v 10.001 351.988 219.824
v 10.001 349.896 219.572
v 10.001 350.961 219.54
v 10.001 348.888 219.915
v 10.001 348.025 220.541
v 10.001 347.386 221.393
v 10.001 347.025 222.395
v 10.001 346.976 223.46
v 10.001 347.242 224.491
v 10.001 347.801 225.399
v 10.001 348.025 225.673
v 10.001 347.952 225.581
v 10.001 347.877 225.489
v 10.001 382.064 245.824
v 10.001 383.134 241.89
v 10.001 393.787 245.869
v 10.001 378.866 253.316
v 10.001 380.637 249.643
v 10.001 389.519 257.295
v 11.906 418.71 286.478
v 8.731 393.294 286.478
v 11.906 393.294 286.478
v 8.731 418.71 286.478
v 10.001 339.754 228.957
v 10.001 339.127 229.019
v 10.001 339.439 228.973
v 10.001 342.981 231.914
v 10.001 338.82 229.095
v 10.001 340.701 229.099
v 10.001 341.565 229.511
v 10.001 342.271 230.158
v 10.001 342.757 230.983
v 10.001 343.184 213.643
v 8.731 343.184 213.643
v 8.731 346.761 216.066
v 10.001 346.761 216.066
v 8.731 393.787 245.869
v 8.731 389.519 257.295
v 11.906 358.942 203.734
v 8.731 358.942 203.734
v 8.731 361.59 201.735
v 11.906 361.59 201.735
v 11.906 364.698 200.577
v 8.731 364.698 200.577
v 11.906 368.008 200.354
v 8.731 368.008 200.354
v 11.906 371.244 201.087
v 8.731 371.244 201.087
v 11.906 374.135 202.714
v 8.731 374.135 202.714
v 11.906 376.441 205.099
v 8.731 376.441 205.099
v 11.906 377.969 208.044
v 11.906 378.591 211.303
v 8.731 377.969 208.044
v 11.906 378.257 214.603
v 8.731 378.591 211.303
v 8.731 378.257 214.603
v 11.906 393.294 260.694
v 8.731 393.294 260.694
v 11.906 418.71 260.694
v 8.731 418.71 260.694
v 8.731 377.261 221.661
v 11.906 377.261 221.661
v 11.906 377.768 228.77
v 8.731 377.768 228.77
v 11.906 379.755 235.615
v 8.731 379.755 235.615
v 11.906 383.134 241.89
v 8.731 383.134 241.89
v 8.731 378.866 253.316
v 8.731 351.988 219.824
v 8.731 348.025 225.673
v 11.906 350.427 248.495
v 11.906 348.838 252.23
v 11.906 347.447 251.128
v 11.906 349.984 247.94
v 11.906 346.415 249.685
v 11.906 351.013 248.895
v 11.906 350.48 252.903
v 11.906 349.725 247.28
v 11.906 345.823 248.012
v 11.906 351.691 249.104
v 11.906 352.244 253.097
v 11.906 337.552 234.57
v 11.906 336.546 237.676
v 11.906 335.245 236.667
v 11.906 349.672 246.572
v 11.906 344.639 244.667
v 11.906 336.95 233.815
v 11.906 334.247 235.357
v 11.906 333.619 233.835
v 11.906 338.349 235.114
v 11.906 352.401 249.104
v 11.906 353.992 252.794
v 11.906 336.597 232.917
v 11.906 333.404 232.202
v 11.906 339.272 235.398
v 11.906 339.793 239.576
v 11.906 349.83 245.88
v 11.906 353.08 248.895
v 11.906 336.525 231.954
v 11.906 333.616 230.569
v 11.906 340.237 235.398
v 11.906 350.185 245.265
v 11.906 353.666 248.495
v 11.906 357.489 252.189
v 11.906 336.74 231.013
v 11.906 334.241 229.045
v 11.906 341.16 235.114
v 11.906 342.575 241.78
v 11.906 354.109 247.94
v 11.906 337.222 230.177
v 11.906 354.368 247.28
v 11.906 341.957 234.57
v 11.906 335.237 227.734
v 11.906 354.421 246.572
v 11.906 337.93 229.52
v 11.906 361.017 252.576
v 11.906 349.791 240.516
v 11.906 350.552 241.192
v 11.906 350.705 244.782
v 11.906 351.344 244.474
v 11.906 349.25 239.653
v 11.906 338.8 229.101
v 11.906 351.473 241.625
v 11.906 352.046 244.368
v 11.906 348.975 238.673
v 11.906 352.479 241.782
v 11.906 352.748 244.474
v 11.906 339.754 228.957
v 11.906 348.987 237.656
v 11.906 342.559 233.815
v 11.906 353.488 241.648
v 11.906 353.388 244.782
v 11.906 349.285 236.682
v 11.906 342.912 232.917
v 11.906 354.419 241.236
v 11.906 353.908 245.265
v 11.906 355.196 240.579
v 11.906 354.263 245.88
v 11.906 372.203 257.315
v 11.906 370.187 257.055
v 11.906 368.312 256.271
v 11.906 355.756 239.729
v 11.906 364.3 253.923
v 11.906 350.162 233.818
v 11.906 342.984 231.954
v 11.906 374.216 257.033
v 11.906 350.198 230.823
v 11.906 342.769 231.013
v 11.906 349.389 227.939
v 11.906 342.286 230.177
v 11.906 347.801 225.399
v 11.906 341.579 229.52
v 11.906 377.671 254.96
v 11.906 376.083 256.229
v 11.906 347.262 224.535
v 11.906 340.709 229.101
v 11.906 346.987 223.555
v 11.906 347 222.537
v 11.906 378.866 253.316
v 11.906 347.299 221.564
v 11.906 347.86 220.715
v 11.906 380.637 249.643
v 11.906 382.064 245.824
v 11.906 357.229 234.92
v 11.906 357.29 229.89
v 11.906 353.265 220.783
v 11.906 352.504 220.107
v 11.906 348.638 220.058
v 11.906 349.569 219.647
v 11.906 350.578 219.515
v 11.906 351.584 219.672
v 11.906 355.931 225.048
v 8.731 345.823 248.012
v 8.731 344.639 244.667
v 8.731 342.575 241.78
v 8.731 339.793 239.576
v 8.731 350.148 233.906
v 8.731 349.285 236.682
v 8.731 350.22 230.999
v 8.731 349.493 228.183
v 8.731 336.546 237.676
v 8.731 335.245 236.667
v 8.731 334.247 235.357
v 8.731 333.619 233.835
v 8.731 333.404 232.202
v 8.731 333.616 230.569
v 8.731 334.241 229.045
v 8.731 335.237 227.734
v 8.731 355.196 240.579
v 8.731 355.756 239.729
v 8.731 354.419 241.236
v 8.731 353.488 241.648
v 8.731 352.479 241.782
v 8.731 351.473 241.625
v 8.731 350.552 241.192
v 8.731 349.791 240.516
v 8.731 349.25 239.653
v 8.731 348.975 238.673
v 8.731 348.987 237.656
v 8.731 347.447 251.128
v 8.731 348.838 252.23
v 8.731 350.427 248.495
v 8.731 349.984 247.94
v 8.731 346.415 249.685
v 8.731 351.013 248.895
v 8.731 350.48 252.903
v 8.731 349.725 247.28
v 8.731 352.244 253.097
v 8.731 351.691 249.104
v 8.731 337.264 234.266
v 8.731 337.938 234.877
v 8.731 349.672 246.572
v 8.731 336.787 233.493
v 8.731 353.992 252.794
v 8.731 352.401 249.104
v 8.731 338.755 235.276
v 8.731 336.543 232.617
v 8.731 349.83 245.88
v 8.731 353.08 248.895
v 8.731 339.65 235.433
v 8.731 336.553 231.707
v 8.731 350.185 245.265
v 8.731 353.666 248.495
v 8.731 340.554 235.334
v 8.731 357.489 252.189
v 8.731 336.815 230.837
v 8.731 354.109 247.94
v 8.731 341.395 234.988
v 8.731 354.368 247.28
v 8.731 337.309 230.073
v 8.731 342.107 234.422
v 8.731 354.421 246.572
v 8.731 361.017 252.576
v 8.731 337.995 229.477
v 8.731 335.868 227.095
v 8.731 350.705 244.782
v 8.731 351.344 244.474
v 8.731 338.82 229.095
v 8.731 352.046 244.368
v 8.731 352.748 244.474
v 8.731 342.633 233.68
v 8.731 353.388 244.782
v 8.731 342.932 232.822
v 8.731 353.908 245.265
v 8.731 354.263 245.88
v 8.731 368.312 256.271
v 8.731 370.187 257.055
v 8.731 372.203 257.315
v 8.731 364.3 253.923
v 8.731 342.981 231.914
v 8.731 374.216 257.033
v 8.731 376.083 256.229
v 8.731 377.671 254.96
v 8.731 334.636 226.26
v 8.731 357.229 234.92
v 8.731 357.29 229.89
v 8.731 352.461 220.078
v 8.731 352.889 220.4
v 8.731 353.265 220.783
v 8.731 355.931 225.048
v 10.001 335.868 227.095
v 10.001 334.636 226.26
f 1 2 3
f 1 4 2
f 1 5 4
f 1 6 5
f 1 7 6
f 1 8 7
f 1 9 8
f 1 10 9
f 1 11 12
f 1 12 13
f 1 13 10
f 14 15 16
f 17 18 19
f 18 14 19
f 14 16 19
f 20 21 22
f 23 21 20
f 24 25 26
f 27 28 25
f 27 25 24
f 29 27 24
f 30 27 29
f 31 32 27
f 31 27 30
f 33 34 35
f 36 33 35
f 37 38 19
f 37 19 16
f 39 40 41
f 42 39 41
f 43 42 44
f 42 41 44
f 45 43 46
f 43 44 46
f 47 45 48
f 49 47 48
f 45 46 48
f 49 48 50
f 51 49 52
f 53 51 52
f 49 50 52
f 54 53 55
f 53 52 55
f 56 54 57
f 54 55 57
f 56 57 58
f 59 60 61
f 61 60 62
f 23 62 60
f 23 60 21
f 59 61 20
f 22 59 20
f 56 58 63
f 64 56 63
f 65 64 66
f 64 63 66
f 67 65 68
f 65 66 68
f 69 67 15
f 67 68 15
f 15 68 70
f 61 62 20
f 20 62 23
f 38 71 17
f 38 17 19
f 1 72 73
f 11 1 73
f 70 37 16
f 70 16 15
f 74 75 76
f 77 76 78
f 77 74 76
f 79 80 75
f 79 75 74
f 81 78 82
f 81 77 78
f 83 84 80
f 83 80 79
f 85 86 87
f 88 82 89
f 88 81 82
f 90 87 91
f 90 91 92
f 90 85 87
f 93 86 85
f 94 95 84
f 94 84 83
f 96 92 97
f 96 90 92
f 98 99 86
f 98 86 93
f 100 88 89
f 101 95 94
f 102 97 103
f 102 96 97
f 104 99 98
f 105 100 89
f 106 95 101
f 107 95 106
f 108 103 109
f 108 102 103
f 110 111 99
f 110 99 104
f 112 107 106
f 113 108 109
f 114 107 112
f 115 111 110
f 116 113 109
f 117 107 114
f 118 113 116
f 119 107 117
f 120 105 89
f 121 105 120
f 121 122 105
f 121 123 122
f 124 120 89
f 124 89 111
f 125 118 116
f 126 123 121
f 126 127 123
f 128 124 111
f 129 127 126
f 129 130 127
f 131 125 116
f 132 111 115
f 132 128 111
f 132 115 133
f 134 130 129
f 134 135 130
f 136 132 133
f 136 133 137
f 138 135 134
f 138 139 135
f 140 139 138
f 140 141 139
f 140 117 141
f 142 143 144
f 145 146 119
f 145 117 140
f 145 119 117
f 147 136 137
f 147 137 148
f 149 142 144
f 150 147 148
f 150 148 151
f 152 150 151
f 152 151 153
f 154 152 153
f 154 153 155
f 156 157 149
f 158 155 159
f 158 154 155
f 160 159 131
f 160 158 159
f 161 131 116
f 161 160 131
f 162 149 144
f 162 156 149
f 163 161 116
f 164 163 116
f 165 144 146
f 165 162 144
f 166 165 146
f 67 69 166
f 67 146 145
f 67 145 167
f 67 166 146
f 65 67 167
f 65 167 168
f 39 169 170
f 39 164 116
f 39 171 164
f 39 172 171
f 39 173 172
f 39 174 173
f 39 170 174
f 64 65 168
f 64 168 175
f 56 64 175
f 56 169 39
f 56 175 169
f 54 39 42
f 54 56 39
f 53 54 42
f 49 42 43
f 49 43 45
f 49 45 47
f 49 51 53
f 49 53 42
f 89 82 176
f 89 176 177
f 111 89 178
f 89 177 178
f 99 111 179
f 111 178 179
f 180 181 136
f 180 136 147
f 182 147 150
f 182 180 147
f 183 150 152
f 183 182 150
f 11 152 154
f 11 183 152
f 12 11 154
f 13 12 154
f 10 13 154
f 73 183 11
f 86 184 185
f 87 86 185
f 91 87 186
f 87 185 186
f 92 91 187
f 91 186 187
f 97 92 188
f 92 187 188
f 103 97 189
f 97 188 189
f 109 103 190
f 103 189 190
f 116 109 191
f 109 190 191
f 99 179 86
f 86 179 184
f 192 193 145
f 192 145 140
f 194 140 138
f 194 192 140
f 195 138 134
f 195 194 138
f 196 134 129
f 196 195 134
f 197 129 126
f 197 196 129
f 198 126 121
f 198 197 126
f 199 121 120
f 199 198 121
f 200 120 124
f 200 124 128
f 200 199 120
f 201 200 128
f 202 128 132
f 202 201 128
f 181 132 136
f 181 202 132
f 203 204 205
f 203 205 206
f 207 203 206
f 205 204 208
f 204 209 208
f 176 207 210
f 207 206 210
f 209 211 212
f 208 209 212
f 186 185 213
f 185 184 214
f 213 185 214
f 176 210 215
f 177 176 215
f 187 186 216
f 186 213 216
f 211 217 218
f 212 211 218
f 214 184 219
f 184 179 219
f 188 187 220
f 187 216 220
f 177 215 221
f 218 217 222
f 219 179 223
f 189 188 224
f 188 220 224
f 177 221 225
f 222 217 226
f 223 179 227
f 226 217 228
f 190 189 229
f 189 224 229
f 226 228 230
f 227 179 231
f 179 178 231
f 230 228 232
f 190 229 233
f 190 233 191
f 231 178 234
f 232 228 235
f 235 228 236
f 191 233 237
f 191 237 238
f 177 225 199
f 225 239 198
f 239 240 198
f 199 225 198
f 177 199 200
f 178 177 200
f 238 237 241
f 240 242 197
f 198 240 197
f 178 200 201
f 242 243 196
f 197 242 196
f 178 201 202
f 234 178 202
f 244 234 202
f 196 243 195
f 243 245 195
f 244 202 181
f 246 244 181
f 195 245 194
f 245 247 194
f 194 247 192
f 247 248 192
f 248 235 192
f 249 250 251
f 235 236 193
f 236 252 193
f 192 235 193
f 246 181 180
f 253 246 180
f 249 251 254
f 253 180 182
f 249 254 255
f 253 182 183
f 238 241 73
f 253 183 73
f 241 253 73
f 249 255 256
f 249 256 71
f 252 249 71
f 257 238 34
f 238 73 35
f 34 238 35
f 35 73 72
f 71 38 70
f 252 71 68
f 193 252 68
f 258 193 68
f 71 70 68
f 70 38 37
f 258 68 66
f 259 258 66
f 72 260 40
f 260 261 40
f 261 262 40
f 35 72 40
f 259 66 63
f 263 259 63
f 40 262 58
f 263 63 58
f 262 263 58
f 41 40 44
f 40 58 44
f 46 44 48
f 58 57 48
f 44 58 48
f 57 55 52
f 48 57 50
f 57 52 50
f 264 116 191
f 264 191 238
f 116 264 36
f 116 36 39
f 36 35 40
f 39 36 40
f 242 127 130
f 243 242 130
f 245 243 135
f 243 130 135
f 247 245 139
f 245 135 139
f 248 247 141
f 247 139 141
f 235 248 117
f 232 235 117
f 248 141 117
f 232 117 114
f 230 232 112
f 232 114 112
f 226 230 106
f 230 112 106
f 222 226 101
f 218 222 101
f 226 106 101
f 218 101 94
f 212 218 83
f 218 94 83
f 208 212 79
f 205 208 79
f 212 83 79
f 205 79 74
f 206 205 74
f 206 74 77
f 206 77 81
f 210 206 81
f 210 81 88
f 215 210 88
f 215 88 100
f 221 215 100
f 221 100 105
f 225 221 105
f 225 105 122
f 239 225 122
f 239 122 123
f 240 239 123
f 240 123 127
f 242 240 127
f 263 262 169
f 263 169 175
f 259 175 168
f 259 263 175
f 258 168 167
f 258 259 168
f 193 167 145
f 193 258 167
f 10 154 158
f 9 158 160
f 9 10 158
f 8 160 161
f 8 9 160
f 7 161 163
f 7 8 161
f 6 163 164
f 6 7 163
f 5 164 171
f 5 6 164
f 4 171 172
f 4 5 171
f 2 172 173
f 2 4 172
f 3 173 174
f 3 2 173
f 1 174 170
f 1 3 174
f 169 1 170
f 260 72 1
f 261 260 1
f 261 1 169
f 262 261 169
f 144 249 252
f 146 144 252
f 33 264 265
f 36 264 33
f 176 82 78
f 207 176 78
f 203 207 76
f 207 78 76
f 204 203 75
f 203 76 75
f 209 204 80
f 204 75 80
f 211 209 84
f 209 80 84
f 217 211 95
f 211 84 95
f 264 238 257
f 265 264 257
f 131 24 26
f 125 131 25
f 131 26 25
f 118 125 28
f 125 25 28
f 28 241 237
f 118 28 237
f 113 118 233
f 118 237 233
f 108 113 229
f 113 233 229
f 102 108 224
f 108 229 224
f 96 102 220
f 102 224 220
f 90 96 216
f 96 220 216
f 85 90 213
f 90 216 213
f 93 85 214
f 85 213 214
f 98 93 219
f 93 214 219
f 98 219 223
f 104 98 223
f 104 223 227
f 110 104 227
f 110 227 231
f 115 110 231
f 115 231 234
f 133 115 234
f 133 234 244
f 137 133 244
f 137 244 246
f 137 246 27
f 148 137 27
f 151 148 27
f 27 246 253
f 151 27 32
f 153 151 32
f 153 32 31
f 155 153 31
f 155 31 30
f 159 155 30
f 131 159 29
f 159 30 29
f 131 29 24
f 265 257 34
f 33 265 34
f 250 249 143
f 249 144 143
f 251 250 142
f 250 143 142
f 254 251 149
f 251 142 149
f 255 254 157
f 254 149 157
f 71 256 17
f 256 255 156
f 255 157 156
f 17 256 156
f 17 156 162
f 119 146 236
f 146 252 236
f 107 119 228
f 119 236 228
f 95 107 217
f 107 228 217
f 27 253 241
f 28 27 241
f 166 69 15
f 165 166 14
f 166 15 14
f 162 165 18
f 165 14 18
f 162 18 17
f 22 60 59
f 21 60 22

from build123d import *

# Parameters (mm, degrees)
BOSS_EXTRUDE2_DEPTH            = 19.05
SKETCH9_R                      = 3.2385
SKETCH9_R_2                    = 3.175
CUT_EXTRUDE4_DEPTH             = 153.631238014
CUT_EXTRUDE7_DEPTH             = 52.07
SKETCH16_W                     = 6.35
SKETCH16_H                     = 9.525
BOSS_EXTRUDE3_DEPTH            = 52.07
BOSS_EXTRUDE5_DEPTH            = 38.1
CUT_EXTRUDE10_DEPTH            = 153.631238014
SKETCH22_R                     = 3.175
CUT_EXTRUDE11_DEPTH            = 535.426844636
CUT_EXTRUDE13_DEPTH            = 3.175
CUT_EXTRUDE13_DEPTH_BACK       = 5.08
SKETCH27_R                     = 6.35
SKETCH28_W                     = 12.7
SKETCH28_H                     = 6.35
CUT_EXTRUDE14_DEPTH            = 6.35
CUT_EXTRUDE18_DEPTH            = 25.4
CUT_EXTRUDE23_REACH            = 116.123
SKETCH48_W                     = 4.7625
SKETCH48_H                     = 46.015558287
BOSS_EXTRUDE6_DEPTH            = 2.38125
BOSS_EXTRUDE9_START            = 6.35
SKETCH41_R                     = 1.651
BOSS_EXTRUDE9_DEPTH            = 3.175
SKETCH44_W                     = 2.15265
SKETCH44_H                     = 21.43125
F_8_CLEARANCE_HOLE1_AT_2_COUNT = 2
F_8_CLEARANCE_HOLE1_AT_2_PITCH = 14.1097
SKETCH54_R                     = 3.2385
CUT_EXTRUDE29_DEPTH            = 534.965103431
BOSS_EXTRUDE17_DEPTH           = 3.175
SKETCH47_R                     = 2.38125
CUT_EXTRUDE22_DEPTH            = 534.965103431
FILLET10_R                     = 12.7
FILLET11_R                     = 7.62
BOSS_EXTRUDE10_DEPTH           = 4.7625
SKETCH57_R                     = 3.175
CUT_EXTRUDE31_DEPTH            = 534.497648303
SKETCH58_R                     = 3.175
CUT_EXTRUDE32_DEPTH            = 534.497648303
BOSS_EXTRUDE12_DEPTH           = 4.7625
FILLET4_R                      = 161.925
CUT_EXTRUDE33_DEPTH            = 534.497648303
SKETCH63_W                     = 2.45745
SKETCH63_H                     = 21.43125
FILLET6_R                      = 1.27
FILLET7_R                      = 2
FILLET9_R                      = 12.7
FILLET8_R                      = 6.35
BOSS_EXTRUDE15_DEPTH           = 1.27
SKETCH67_W                     = 25.783881398
SKETCH67_H                     = 25.415540234
BOSS_EXTRUDE16_DEPTH           = 3.175


with BuildPart() as part:
    # Sketch4 → Boss-Extrude2 (new, symmetric)
    with BuildSketch(Plane(origin=(0, 0, 0), x_dir=(0, 0, -1), z_dir=(1, 0, 0))):
        with BuildLine():
            Line((-186.846778023, 405.26156603), (-158.205357675, 369.030625673))
            Line((-158.205357675, 369.030625673), (-140.256718713, 375.414109002))
            Line((-140.256718713, 375.414109002), (-157.704906478, 424.473722165))
            Line((-157.704906478, 424.473722165), (-175.65354544, 418.090238836))
            Line((-175.65354544, 418.090238836), (-177.355807661, 422.876542559))
            ThreePointArc((-177.355807661, 422.876542559), (-243.191724351, 450.45722133), (-264.474202715, 382.324131846))
            Line((-264.474202715, 382.324131846), (-237.676042854, 336.546390968))
            ThreePointArc((-237.676042854, 336.546390968), (-229.492825478, 334.008496997), (-226.23061556, 341.930866521))
            Line((-226.23061556, 341.930866521), (-246.687133952, 397.9992122))
            ThreePointArc((-246.687133952, 397.9992122), (-243.637808701, 421.265815224), (-222.825693032, 432.10505146))
            ThreePointArc((-222.825693032, 432.10505146), (-209.542420342, 429.05833538), (-198.914683118, 420.527273681))
            Line((-198.914683118, 420.527273681), (-186.846778023, 405.26156603))
        make_face()
    extrude(amount=BOSS_EXTRUDE2_DEPTH, both=True)

    # Sketch9 → Cut-Extrude4 (cut, through all)
    with BuildSketch(Plane(origin=(0, 426.601549941, 151.722026824), x_dir=(1, 0, 0), z_dir=(0, 0.9421857722885012, 0.33509098838542445))):
        with Locations(Location((6.35, -19.05, 0), (0, 0, 270))):
            Circle(SKETCH9_R)
        with Locations((-9.525, -6.35)):
            Circle(SKETCH9_R_2)
        with Locations((9.525, -6.35)):
            Circle(SKETCH9_R_2)
    extrude(amount=-CUT_EXTRUDE4_DEPTH, mode=Mode.SUBTRACT)

    # Sketch15 → Cut-Extrude7 (cut)
    with BuildSketch(Plane(origin=(0, 426.601549941, 151.722026824), x_dir=(1, 0, 0), z_dir=(0, 0.9421857722885011, 0.33509098838542445))):
        Polygon((-3.175, -9.525), (6.35, -9.525), (9.525, -9.525), (9.525, -6.35), (-9.525, -6.35), (-9.525, -9.525), align=None)
    extrude(amount=-CUT_EXTRUDE7_DEPTH, mode=Mode.SUBTRACT)

    # Sketch16 → Boss-Extrude3 (add)
    with BuildSketch(Plane(origin=(0, 426.601549941, 151.722026824), x_dir=(1, 0, 0), z_dir=(0, 0.9421857722885012, 0.3350909883854245))):
        with Locations((15.875, -1.5875)):
            Rectangle(SKETCH16_W, SKETCH16_H)
        with Locations((-15.875, -1.5875)):
            Rectangle(SKETCH16_W, SKETCH16_H)
    extrude(amount=-BOSS_EXTRUDE3_DEPTH)

    # Sketch20 → Boss-Extrude5 (add)
    with BuildSketch(Plane(origin=(19.05, 0, 0), x_dir=(0, 0, -1), z_dir=(1, 0, 0))):
        with BuildLine():
            Line((-148.730586997, 427.665463829), (-175.65354544, 418.090238836))
            Line((-175.65354544, 418.090238836), (-177.355807661, 422.876542559))
            ThreePointArc((-177.355807661, 422.876542559), (-196.734821197, 447.304238729), (-227.005535657, 454.78370073))
            Line((-227.005535657, 454.78370073), (-160.433639767, 460.571301927))
            Line((-160.433639767, 460.571301927), (-148.730586997, 427.665463829))
        make_face()
    extrude(amount=-BOSS_EXTRUDE5_DEPTH)

    # Sketch21 → Cut-Extrude10 (cut, through all)
    with BuildSketch(Plane(origin=(0, 426.601549941, 151.722026824), x_dir=(1, 0, 0), z_dir=(0, -0.942185772288501, -0.335090988385425))):
        with BuildLine():
            Line((19.05, 14.478), (19.05, 6.35))
            Line((19.05, 6.35), (19.05, -3.175))
            Line((19.05, -3.175), (-19.05, -3.175))
            Line((-19.05, -3.175), (-19.05, 6.35))
            Line((-19.05, 6.35), (-19.05, 14.478))
            Line((-19.05, 14.478), (-15.97025, 14.478))
            Line((-15.97025, 14.478), (-8.0264, 25.0698))
            ThreePointArc((-8.0264, 25.0698), (0, 29.083), (8.0264, 25.0698))
            Line((8.0264, 25.0698), (15.97025, 14.478))
            Line((15.97025, 14.478), (19.05, 14.478))
        make_face()
    extrude(amount=-CUT_EXTRUDE10_DEPTH, mode=Mode.SUBTRACT)

    # Sketch22 → Cut-Extrude11 (cut, through all)
    with BuildSketch(Plane(origin=(19.05, 0, 0), x_dir=(0, 0, -1), z_dir=(1, 0, 0))):
        with Locations((-253.002053482, 402.413470169)):
            Circle(SKETCH22_R)
        with Locations((-239.490468058, 381.184164458)):
            Circle(SKETCH22_R)
    extrude(amount=-CUT_EXTRUDE11_DEPTH, mode=Mode.SUBTRACT)

    # Sketch27 → Cut-Extrude13 (cut, two sides: drawn at the far end of the back side and taken through both)
    with BuildSketch(Plane(origin=(-17.1704, -4.31523473, 12.133279938), x_dir=(-0.5432430093887411, -0.1572894719134328, -0.8247102853581115), z_dir=(0.7999999999999949, 0.20105459303125733, -0.5653114633731071)).offset(-CUT_EXTRUDE13_DEPTH_BACK)):
        with Locations(Location((-205.469391655, 414.258576717, 0), (0, 0, 168.252215141))):
            Circle(SKETCH27_R)
    extrude(amount=CUT_EXTRUDE13_DEPTH + CUT_EXTRUDE13_DEPTH_BACK, mode=Mode.SUBTRACT)

    # Sketch28 → Cut-Extrude14 (cut)
    with BuildSketch(Plane(origin=(0, -4.85144733, 13.640965611), x_dir=(-1, 0, 0), z_dir=(-1.200145339583648e-13, 0.33509098838542495, -0.942185772288501))):
        with Locations((-12.7, 481.353594719)):
            Rectangle(SKETCH28_W, SKETCH28_H)
    extrude(amount=-CUT_EXTRUDE14_DEPTH, mode=Mode.SUBTRACT)

    # Sketch33 → Cut-Extrude18 (cut, symmetric)
    with BuildSketch(Plane(origin=(0, 0, 0), x_dir=(0, 0, -1), z_dir=(1, 0, 0))):
        with BuildLine():
            Line((-199.247314558, 457.196933995), (-212.078601064, 429.719395123))
            ThreePointArc((-212.078601064, 429.719395123), (-239.987832709, 425.42992694), (-246.687133952, 397.9992122))
            Line((-246.687133952, 397.9992122), (-226.23061556, 341.930866521))
            ThreePointArc((-226.23061556, 341.930866521), (-229.492825478, 334.008496997), (-237.676042854, 336.546390968))
            Line((-237.676042854, 336.546390968), (-264.474202715, 382.324131846))
            ThreePointArc((-264.474202715, 382.324131846), (-265.693591855, 428.871937811), (-227.005535657, 454.78370073))
            Line((-227.005535657, 454.78370073), (-199.247314558, 457.196933995))
        make_face()
    extrude(amount=CUT_EXTRUDE18_DEPTH, both=True, mode=Mode.SUBTRACT)

    # Cut-Extrude23: up to this plane
    cut_extrude23_end = Plane(origin=(-108.1095773, 454.78370073, 227.005535657), z_dir=(0, 0.9962422144646194, 0.08661091223761264))
    # Sketch48 → Cut-Extrude23 (cut, up to the surface)
    with BuildSketch(Plane(origin=(0, 377.541936778, 134.273839059), x_dir=(1, 0, 0), z_dir=(0, -0.9421857722885012, -0.3350909883854244)), mode=Mode.PRIVATE) as cut_extrude23_sk1:
        with Locations((0, 32.532779144)):
            Rectangle(SKETCH48_W, SKETCH48_H)
    cut_extrude23_tool1 = split(extrude(cut_extrude23_sk1.sketch, amount=-CUT_EXTRUDE23_REACH, mode=Mode.PRIVATE), bisect_by=cut_extrude23_end, keep=Keep.BOTH, mode=Mode.PRIVATE)
    add(cut_extrude23_tool1.solids().sort_by_distance((0, 366.640496, 164.925761))[0], mode=Mode.SUBTRACT)


with BuildPart() as cut_extrude23_piece_1:
    # of the separate pieces the step leaves, piece 1, a body of its own (cut_extrude23_pieces)
    add(part.part.solids().sort_by_distance((-19.05, 457.196933995, 199.247314558))[0])


with BuildPart() as cut_extrude23_piece_2:
    # of the separate pieces the step leaves, piece 2, a body of its own (cut_extrude23_pieces)
    add(part.part.solids().sort_by_distance((19.05, 457.196933995, 199.247314558))[0])


with BuildPart() as body_3:
    # Sketch35 → Boss-Extrude6 (new, symmetric)
    with BuildSketch(Plane(origin=(0, 0, 0), x_dir=(0, 0, -1), z_dir=(1, 0, 0))):
        with BuildLine():
            Line((-237.676042854, 336.546390968), (-264.474202715, 382.324131846))
            ThreePointArc((-264.474202715, 382.324131846), (-265.472121099, 429.295088492), (-226.053156197, 454.857009691))
            Line((-226.053156197, 454.857009691), (-204.645177824, 456.727656689))
            Line((-204.645177824, 456.727656689), (-195.764245071, 457.499743714))
            Line((-195.764245071, 457.499743714), (-187.436501805, 446.96528118))
            Line((-187.436501805, 446.96528118), (-172.228614898, 427.727546572))
            Line((-172.228614898, 427.727546572), (-189.069775711, 408.073622684))
            Line((-189.069775711, 408.073622684), (-198.914683118, 420.527273681))
            ThreePointArc((-198.914683118, 420.527273681), (-209.542420342, 429.05833538), (-222.825693032, 432.10505146))
            ThreePointArc((-222.825693032, 432.10505146), (-243.637808701, 421.265815224), (-246.687133952, 397.9992122))
            Line((-246.687133952, 397.9992122), (-226.23061556, 341.930866521))
            ThreePointArc((-226.23061556, 341.930866521), (-229.492825478, 334.008496997), (-237.676042854, 336.546390968))
        make_face()
    extrude(amount=BOSS_EXTRUDE6_DEPTH, both=True)

    # Sketch44 → #8 Clearance Hole1 (revolve, cut)
    with BuildSketch(Plane(origin=(2.38125, 352.520342369, 238.205511608), x_dir=(0, 0, -1), z_dir=(0, 1, 0))):
        with Locations((1.076325, 10.715625)):
            Rectangle(SKETCH44_W, SKETCH44_H)
    f_8_clearance_hole1 = revolve(axis=Axis((8.73125, 352.520342369, 238.205511608), (-1, 0, 0)), mode=Mode.SUBTRACT)

    # #8 Clearance Hole1 at 2: #8 Clearance Hole1 ×2
    with Locations(*[Vector(0, -0.9047630823191329, -0.42591520854787757) * (i * F_8_CLEARANCE_HOLE1_AT_2_PITCH) for i in range(1, F_8_CLEARANCE_HOLE1_AT_2_COUNT)]):
        add(f_8_clearance_hole1, mode=Mode.SUBTRACT)

    # Sketch56 → Boss-Extrude10 (add)
    with BuildSketch(Plane.ZY.offset(2.38125)):
        Polygon((172.228614898, 427.727546572), (189.069775711, 408.073622684), (150.093881412, 374.128883937), (137.640230415, 383.973791344), align=None)
    extrude(amount=-BOSS_EXTRUDE10_DEPTH)

    # Sketch57 → Cut-Extrude31 (cut, through all)
    with BuildSketch(Plane.ZY.offset(2.38125)):
        with Locations((154.366633975, 389.773278837)):
            Circle(SKETCH57_R)
    extrude(amount=-CUT_EXTRUDE31_DEPTH, mode=Mode.SUBTRACT)

    # Sketch58 → Cut-Extrude32 (cut, through all)
    with BuildSketch(Plane(origin=(2.38125, 0, 0), x_dir=(0, 0, -1), z_dir=(1, 0, 0))):
        with Locations((-251.088512577, 393.691356506)):
            Circle(SKETCH58_R)
    extrude(amount=-CUT_EXTRUDE32_DEPTH, mode=Mode.SUBTRACT)

    # Sketch60 → Boss-Extrude12 (add)
    with BuildSketch(Plane.ZY.offset(2.38125)):
        with BuildLine():
            Line((238.16133602, 337.577946891), (232.720186483, 322.664546316))
            ThreePointArc((232.720186483, 322.664546316), (224.578366438, 318.875645901), (220.789466023, 327.017465946))
            Line((220.789466023, 327.017465946), (226.23061556, 341.930866521))
            ThreePointArc((226.23061556, 341.930866521), (230.019515975, 333.789046476), (238.16133602, 337.577946891))
        make_face()
    extrude(amount=-BOSS_EXTRUDE12_DEPTH)

    # Fillet4
    fillet4_edges = [body_3.edges().sort_by_distance(p)[0] for p in [
        (0, 337.040299626, 237.965175583),
    ]]
    fillet(fillet4_edges, radius=FILLET4_R)

    # Sketch61 → Cut-Extrude33 (cut, through all)
    with BuildSketch(Plane.ZY.offset(2.38125)):
        with BuildLine():
            Line((157.330045228, 408.881093338), (149.454119303, 398.91817254))
            ThreePointArc((149.454119303, 398.91817254), (151.090857413, 398.367142584), (152.779456246, 398.004955291))
            Line((152.779456246, 398.004955291), (159.820775427, 406.912111857))
            Line((159.820775427, 406.912111857), (157.330045228, 408.881093338))
        make_face()
    extrude(amount=-CUT_EXTRUDE33_DEPTH, mode=Mode.SUBTRACT)


with BuildPart() as body_4:
    # Sketch41 → Boss-Extrude9 (new body)
    with BuildSketch(Plane(origin=(2.38125, 0, 0), x_dir=(0, 0, -1), z_dir=(1, 0, 0)).offset(BOSS_EXTRUDE9_START)):
        with BuildLine():
            Line((-259.901827857, 374.513409299), (-237.676042854, 336.546390968))
            ThreePointArc((-237.676042854, 336.546390968), (-233.025285674, 333.458793542), (-227.733605481, 335.23669144))
            Line((-227.733605481, 335.23669144), (-203.734295846, 358.941993885))
            ThreePointArc((-203.734295846, 358.941993885), (-201.795644606, 372.748442455), (-214.603143546, 378.257014105))
            ThreePointArc((-214.603143546, 378.257014105), (-228.769887709, 377.768125905), (-241.890035296, 383.134444861))
            ThreePointArc((-241.890035296, 383.134444861), (-251.386309553, 379.848465993), (-259.901827857, 374.513409299))
        make_face()
        with Locations((-232.19597579, 339.754406706)):
            Circle(SKETCH41_R, mode=Mode.SUBTRACT)
        with BuildLine():
            ThreePointArc((-220.782994488, 353.265112137), (-229.890488905, 357.289515308), (-239.728720687, 355.756064675))
            ThreePointArc((-239.728720687, 355.756064675), (-241.441233915, 350.99713329), (-236.682302529, 349.284620062))
            ThreePointArc((-236.682302529, 349.284620062), (-230.822881705, 350.197907406), (-225.39867097, 347.801066971))
            ThreePointArc((-225.39867097, 347.801066971), (-220.358810146, 348.225251313), (-220.782994488, 353.265112137))
        make_face(mode=Mode.SUBTRACT)
    extrude(amount=BOSS_EXTRUDE9_DEPTH)


with BuildPart() as body_5:
    # Mirror1: mirrored copy
    add(body_4.part.mirror(Plane(origin=(0, 0, 0), x_dir=(0, 0, 1), z_dir=(1, 0, 0))))


with BuildPart() as cut_extrude29_tool:
    # Sketch54 → Cut-Extrude29 (new, through all)
    with BuildSketch(Plane.ZY.offset(11.90625)):
        with Locations(Location((232.19597579, 339.754406706, 0), (0, 0, 180))):
            Circle(SKETCH54_R)
    extrude(amount=-CUT_EXTRUDE29_DEPTH)


with BuildPart() as body_5_1:
    add(body_5.part)

    # Cut-Extrude29: cut by cut_extrude29_tool
    add(cut_extrude29_tool.part, mode=Mode.SUBTRACT)


with BuildPart() as body_4_1:
    add(body_4.part)

    # Cut-Extrude29: cut by cut_extrude29_tool
    add(cut_extrude29_tool.part, mode=Mode.SUBTRACT)

    # Sketch68 → Boss-Extrude17 (add)
    with BuildSketch(Plane(origin=(11.90625, 0, 0), x_dir=(0, 0, -1), z_dir=(1, 0, 0))):
        with BuildLine():
            Line((-249.957697324, 357.526428359), (-243.541665847, 346.566294232))
            ThreePointArc((-243.541665847, 346.566294232), (-252.229748649, 348.838345557), (-249.957697324, 357.526428359))
        make_face()
    extrude(amount=-BOSS_EXTRUDE17_DEPTH)


with BuildPart() as cut_extrude22_tool:
    # Sketch47 → Cut-Extrude22 (new, through all)
    with BuildSketch(Plane(origin=(11.90625, 0, 0), x_dir=(0, 0, -1), z_dir=(1, 0, 0))):
        with Locations((-246.749681585, 352.046361295)):
            Circle(SKETCH47_R)
    extrude(amount=-CUT_EXTRUDE22_DEPTH)


with BuildPart() as body_4_2:
    add(body_4_1.part)

    # Cut-Extrude22: cut by cut_extrude22_tool
    add(cut_extrude22_tool.part, mode=Mode.SUBTRACT)

    # Fillet10
    fillet10_edges = [body_4_2.edges().sort_by_distance(p)[0] for p in [
        (10.31875, 346.566294232, 243.541665847),
        (10.31875, 357.526428359, 249.957697324),
    ]]
    fillet(fillet10_edges, radius=FILLET10_R)

    # Fillet11
    fillet11_edges = [body_4_2.edges().sort_by_distance(p)[0] for p in [
        (10.31875, 374.513409299, 259.901827857),
    ]]
    fillet(fillet11_edges, radius=FILLET11_R)

    # Sketch66 → Boss-Extrude15 (add)
    with BuildSketch(Plane.ZY.offset(-8.73125)):
        Polygon((219.676143821, 352.088594489), (232.292980439, 343.540317836), (226.260033989, 334.635985094), (213.643197371, 343.184261748), align=None)
        Polygon((241.890035296, 383.134444861), (253.315956343, 378.866411532), (257.295076427, 389.518885027), (245.86915538, 393.786918357), align=None)
    extrude(amount=-BOSS_EXTRUDE15_DEPTH)


with BuildPart() as body_5_2:
    add(body_5_1.part)

    # Cut-Extrude22: cut by cut_extrude22_tool
    add(cut_extrude22_tool.part, mode=Mode.SUBTRACT)


with BuildPart() as f_10_0_1935_diameter_hole1_tool:
    # Sketch63 → #10 (0.1935) Diameter Hole1 (revolve)
    with BuildSketch(Plane(origin=(-2.38125, 447.807292483, 200.24390249), x_dir=(0, 0, 1), z_dir=(0, 1, 0))):
        with Locations((1.228725, 10.715625)):
            Rectangle(SKETCH63_W, SKETCH63_H)
    revolve(axis=Axis((-8.73125, 447.807292483, 200.24390249), (1, 0, 0)))


with BuildPart() as cut_extrude23_piece_2_1:
    add(cut_extrude23_piece_2.part)

    # #10 (0.1935) Diameter Hole1: cut by f_10_0_1935_diameter_hole1_tool
    add(f_10_0_1935_diameter_hole1_tool.part, mode=Mode.SUBTRACT)


with BuildPart() as body_3_1:
    add(body_3.part)

    # #10 (0.1935) Diameter Hole1: cut by f_10_0_1935_diameter_hole1_tool
    add(f_10_0_1935_diameter_hole1_tool.part, mode=Mode.SUBTRACT)

    # Fillet6
    fillet6_edges = [body_3_1.edges().sort_by_distance(p)[0] for p in [
        (0, 408.881093338, 157.330045228),
    ]]
    fillet(fillet6_edges, radius=FILLET6_R)

    # Fillet7
    fillet7_edges = [body_3_1.edges().sort_by_distance(p)[0] for p in [
        (0, 406.912111857, 159.820775427),
        (0, 398.004955291, 152.779456246),
    ]]
    fillet(fillet7_edges, radius=FILLET7_R)

    # Fillet9
    fillet9_edges = [body_3_1.edges().sort_by_distance(p)[0] for p in [
        (0, 457.499743714, 195.764245071),
    ]]
    fillet(fillet9_edges, radius=FILLET9_R)

    # Fillet8
    fillet8_edges = [body_3_1.edges().sort_by_distance(p)[0] for p in [
        (0, 383.973791344, 137.640230415),
        (0, 374.128883937, 150.093881412),
    ]]
    fillet(fillet8_edges, radius=FILLET8_R)


with BuildPart() as body_2:
    # Sketch67 → Boss-Extrude16 (new body)
    with BuildSketch(Plane.ZY.offset(-8.73125)):
        with Locations((273.586337896, 406.00175714)):
            Rectangle(SKETCH67_W, SKETCH67_H)
    extrude(amount=-BOSS_EXTRUDE16_DEPTH)


solid = Compound([body_4_2.part, body_2.part])
